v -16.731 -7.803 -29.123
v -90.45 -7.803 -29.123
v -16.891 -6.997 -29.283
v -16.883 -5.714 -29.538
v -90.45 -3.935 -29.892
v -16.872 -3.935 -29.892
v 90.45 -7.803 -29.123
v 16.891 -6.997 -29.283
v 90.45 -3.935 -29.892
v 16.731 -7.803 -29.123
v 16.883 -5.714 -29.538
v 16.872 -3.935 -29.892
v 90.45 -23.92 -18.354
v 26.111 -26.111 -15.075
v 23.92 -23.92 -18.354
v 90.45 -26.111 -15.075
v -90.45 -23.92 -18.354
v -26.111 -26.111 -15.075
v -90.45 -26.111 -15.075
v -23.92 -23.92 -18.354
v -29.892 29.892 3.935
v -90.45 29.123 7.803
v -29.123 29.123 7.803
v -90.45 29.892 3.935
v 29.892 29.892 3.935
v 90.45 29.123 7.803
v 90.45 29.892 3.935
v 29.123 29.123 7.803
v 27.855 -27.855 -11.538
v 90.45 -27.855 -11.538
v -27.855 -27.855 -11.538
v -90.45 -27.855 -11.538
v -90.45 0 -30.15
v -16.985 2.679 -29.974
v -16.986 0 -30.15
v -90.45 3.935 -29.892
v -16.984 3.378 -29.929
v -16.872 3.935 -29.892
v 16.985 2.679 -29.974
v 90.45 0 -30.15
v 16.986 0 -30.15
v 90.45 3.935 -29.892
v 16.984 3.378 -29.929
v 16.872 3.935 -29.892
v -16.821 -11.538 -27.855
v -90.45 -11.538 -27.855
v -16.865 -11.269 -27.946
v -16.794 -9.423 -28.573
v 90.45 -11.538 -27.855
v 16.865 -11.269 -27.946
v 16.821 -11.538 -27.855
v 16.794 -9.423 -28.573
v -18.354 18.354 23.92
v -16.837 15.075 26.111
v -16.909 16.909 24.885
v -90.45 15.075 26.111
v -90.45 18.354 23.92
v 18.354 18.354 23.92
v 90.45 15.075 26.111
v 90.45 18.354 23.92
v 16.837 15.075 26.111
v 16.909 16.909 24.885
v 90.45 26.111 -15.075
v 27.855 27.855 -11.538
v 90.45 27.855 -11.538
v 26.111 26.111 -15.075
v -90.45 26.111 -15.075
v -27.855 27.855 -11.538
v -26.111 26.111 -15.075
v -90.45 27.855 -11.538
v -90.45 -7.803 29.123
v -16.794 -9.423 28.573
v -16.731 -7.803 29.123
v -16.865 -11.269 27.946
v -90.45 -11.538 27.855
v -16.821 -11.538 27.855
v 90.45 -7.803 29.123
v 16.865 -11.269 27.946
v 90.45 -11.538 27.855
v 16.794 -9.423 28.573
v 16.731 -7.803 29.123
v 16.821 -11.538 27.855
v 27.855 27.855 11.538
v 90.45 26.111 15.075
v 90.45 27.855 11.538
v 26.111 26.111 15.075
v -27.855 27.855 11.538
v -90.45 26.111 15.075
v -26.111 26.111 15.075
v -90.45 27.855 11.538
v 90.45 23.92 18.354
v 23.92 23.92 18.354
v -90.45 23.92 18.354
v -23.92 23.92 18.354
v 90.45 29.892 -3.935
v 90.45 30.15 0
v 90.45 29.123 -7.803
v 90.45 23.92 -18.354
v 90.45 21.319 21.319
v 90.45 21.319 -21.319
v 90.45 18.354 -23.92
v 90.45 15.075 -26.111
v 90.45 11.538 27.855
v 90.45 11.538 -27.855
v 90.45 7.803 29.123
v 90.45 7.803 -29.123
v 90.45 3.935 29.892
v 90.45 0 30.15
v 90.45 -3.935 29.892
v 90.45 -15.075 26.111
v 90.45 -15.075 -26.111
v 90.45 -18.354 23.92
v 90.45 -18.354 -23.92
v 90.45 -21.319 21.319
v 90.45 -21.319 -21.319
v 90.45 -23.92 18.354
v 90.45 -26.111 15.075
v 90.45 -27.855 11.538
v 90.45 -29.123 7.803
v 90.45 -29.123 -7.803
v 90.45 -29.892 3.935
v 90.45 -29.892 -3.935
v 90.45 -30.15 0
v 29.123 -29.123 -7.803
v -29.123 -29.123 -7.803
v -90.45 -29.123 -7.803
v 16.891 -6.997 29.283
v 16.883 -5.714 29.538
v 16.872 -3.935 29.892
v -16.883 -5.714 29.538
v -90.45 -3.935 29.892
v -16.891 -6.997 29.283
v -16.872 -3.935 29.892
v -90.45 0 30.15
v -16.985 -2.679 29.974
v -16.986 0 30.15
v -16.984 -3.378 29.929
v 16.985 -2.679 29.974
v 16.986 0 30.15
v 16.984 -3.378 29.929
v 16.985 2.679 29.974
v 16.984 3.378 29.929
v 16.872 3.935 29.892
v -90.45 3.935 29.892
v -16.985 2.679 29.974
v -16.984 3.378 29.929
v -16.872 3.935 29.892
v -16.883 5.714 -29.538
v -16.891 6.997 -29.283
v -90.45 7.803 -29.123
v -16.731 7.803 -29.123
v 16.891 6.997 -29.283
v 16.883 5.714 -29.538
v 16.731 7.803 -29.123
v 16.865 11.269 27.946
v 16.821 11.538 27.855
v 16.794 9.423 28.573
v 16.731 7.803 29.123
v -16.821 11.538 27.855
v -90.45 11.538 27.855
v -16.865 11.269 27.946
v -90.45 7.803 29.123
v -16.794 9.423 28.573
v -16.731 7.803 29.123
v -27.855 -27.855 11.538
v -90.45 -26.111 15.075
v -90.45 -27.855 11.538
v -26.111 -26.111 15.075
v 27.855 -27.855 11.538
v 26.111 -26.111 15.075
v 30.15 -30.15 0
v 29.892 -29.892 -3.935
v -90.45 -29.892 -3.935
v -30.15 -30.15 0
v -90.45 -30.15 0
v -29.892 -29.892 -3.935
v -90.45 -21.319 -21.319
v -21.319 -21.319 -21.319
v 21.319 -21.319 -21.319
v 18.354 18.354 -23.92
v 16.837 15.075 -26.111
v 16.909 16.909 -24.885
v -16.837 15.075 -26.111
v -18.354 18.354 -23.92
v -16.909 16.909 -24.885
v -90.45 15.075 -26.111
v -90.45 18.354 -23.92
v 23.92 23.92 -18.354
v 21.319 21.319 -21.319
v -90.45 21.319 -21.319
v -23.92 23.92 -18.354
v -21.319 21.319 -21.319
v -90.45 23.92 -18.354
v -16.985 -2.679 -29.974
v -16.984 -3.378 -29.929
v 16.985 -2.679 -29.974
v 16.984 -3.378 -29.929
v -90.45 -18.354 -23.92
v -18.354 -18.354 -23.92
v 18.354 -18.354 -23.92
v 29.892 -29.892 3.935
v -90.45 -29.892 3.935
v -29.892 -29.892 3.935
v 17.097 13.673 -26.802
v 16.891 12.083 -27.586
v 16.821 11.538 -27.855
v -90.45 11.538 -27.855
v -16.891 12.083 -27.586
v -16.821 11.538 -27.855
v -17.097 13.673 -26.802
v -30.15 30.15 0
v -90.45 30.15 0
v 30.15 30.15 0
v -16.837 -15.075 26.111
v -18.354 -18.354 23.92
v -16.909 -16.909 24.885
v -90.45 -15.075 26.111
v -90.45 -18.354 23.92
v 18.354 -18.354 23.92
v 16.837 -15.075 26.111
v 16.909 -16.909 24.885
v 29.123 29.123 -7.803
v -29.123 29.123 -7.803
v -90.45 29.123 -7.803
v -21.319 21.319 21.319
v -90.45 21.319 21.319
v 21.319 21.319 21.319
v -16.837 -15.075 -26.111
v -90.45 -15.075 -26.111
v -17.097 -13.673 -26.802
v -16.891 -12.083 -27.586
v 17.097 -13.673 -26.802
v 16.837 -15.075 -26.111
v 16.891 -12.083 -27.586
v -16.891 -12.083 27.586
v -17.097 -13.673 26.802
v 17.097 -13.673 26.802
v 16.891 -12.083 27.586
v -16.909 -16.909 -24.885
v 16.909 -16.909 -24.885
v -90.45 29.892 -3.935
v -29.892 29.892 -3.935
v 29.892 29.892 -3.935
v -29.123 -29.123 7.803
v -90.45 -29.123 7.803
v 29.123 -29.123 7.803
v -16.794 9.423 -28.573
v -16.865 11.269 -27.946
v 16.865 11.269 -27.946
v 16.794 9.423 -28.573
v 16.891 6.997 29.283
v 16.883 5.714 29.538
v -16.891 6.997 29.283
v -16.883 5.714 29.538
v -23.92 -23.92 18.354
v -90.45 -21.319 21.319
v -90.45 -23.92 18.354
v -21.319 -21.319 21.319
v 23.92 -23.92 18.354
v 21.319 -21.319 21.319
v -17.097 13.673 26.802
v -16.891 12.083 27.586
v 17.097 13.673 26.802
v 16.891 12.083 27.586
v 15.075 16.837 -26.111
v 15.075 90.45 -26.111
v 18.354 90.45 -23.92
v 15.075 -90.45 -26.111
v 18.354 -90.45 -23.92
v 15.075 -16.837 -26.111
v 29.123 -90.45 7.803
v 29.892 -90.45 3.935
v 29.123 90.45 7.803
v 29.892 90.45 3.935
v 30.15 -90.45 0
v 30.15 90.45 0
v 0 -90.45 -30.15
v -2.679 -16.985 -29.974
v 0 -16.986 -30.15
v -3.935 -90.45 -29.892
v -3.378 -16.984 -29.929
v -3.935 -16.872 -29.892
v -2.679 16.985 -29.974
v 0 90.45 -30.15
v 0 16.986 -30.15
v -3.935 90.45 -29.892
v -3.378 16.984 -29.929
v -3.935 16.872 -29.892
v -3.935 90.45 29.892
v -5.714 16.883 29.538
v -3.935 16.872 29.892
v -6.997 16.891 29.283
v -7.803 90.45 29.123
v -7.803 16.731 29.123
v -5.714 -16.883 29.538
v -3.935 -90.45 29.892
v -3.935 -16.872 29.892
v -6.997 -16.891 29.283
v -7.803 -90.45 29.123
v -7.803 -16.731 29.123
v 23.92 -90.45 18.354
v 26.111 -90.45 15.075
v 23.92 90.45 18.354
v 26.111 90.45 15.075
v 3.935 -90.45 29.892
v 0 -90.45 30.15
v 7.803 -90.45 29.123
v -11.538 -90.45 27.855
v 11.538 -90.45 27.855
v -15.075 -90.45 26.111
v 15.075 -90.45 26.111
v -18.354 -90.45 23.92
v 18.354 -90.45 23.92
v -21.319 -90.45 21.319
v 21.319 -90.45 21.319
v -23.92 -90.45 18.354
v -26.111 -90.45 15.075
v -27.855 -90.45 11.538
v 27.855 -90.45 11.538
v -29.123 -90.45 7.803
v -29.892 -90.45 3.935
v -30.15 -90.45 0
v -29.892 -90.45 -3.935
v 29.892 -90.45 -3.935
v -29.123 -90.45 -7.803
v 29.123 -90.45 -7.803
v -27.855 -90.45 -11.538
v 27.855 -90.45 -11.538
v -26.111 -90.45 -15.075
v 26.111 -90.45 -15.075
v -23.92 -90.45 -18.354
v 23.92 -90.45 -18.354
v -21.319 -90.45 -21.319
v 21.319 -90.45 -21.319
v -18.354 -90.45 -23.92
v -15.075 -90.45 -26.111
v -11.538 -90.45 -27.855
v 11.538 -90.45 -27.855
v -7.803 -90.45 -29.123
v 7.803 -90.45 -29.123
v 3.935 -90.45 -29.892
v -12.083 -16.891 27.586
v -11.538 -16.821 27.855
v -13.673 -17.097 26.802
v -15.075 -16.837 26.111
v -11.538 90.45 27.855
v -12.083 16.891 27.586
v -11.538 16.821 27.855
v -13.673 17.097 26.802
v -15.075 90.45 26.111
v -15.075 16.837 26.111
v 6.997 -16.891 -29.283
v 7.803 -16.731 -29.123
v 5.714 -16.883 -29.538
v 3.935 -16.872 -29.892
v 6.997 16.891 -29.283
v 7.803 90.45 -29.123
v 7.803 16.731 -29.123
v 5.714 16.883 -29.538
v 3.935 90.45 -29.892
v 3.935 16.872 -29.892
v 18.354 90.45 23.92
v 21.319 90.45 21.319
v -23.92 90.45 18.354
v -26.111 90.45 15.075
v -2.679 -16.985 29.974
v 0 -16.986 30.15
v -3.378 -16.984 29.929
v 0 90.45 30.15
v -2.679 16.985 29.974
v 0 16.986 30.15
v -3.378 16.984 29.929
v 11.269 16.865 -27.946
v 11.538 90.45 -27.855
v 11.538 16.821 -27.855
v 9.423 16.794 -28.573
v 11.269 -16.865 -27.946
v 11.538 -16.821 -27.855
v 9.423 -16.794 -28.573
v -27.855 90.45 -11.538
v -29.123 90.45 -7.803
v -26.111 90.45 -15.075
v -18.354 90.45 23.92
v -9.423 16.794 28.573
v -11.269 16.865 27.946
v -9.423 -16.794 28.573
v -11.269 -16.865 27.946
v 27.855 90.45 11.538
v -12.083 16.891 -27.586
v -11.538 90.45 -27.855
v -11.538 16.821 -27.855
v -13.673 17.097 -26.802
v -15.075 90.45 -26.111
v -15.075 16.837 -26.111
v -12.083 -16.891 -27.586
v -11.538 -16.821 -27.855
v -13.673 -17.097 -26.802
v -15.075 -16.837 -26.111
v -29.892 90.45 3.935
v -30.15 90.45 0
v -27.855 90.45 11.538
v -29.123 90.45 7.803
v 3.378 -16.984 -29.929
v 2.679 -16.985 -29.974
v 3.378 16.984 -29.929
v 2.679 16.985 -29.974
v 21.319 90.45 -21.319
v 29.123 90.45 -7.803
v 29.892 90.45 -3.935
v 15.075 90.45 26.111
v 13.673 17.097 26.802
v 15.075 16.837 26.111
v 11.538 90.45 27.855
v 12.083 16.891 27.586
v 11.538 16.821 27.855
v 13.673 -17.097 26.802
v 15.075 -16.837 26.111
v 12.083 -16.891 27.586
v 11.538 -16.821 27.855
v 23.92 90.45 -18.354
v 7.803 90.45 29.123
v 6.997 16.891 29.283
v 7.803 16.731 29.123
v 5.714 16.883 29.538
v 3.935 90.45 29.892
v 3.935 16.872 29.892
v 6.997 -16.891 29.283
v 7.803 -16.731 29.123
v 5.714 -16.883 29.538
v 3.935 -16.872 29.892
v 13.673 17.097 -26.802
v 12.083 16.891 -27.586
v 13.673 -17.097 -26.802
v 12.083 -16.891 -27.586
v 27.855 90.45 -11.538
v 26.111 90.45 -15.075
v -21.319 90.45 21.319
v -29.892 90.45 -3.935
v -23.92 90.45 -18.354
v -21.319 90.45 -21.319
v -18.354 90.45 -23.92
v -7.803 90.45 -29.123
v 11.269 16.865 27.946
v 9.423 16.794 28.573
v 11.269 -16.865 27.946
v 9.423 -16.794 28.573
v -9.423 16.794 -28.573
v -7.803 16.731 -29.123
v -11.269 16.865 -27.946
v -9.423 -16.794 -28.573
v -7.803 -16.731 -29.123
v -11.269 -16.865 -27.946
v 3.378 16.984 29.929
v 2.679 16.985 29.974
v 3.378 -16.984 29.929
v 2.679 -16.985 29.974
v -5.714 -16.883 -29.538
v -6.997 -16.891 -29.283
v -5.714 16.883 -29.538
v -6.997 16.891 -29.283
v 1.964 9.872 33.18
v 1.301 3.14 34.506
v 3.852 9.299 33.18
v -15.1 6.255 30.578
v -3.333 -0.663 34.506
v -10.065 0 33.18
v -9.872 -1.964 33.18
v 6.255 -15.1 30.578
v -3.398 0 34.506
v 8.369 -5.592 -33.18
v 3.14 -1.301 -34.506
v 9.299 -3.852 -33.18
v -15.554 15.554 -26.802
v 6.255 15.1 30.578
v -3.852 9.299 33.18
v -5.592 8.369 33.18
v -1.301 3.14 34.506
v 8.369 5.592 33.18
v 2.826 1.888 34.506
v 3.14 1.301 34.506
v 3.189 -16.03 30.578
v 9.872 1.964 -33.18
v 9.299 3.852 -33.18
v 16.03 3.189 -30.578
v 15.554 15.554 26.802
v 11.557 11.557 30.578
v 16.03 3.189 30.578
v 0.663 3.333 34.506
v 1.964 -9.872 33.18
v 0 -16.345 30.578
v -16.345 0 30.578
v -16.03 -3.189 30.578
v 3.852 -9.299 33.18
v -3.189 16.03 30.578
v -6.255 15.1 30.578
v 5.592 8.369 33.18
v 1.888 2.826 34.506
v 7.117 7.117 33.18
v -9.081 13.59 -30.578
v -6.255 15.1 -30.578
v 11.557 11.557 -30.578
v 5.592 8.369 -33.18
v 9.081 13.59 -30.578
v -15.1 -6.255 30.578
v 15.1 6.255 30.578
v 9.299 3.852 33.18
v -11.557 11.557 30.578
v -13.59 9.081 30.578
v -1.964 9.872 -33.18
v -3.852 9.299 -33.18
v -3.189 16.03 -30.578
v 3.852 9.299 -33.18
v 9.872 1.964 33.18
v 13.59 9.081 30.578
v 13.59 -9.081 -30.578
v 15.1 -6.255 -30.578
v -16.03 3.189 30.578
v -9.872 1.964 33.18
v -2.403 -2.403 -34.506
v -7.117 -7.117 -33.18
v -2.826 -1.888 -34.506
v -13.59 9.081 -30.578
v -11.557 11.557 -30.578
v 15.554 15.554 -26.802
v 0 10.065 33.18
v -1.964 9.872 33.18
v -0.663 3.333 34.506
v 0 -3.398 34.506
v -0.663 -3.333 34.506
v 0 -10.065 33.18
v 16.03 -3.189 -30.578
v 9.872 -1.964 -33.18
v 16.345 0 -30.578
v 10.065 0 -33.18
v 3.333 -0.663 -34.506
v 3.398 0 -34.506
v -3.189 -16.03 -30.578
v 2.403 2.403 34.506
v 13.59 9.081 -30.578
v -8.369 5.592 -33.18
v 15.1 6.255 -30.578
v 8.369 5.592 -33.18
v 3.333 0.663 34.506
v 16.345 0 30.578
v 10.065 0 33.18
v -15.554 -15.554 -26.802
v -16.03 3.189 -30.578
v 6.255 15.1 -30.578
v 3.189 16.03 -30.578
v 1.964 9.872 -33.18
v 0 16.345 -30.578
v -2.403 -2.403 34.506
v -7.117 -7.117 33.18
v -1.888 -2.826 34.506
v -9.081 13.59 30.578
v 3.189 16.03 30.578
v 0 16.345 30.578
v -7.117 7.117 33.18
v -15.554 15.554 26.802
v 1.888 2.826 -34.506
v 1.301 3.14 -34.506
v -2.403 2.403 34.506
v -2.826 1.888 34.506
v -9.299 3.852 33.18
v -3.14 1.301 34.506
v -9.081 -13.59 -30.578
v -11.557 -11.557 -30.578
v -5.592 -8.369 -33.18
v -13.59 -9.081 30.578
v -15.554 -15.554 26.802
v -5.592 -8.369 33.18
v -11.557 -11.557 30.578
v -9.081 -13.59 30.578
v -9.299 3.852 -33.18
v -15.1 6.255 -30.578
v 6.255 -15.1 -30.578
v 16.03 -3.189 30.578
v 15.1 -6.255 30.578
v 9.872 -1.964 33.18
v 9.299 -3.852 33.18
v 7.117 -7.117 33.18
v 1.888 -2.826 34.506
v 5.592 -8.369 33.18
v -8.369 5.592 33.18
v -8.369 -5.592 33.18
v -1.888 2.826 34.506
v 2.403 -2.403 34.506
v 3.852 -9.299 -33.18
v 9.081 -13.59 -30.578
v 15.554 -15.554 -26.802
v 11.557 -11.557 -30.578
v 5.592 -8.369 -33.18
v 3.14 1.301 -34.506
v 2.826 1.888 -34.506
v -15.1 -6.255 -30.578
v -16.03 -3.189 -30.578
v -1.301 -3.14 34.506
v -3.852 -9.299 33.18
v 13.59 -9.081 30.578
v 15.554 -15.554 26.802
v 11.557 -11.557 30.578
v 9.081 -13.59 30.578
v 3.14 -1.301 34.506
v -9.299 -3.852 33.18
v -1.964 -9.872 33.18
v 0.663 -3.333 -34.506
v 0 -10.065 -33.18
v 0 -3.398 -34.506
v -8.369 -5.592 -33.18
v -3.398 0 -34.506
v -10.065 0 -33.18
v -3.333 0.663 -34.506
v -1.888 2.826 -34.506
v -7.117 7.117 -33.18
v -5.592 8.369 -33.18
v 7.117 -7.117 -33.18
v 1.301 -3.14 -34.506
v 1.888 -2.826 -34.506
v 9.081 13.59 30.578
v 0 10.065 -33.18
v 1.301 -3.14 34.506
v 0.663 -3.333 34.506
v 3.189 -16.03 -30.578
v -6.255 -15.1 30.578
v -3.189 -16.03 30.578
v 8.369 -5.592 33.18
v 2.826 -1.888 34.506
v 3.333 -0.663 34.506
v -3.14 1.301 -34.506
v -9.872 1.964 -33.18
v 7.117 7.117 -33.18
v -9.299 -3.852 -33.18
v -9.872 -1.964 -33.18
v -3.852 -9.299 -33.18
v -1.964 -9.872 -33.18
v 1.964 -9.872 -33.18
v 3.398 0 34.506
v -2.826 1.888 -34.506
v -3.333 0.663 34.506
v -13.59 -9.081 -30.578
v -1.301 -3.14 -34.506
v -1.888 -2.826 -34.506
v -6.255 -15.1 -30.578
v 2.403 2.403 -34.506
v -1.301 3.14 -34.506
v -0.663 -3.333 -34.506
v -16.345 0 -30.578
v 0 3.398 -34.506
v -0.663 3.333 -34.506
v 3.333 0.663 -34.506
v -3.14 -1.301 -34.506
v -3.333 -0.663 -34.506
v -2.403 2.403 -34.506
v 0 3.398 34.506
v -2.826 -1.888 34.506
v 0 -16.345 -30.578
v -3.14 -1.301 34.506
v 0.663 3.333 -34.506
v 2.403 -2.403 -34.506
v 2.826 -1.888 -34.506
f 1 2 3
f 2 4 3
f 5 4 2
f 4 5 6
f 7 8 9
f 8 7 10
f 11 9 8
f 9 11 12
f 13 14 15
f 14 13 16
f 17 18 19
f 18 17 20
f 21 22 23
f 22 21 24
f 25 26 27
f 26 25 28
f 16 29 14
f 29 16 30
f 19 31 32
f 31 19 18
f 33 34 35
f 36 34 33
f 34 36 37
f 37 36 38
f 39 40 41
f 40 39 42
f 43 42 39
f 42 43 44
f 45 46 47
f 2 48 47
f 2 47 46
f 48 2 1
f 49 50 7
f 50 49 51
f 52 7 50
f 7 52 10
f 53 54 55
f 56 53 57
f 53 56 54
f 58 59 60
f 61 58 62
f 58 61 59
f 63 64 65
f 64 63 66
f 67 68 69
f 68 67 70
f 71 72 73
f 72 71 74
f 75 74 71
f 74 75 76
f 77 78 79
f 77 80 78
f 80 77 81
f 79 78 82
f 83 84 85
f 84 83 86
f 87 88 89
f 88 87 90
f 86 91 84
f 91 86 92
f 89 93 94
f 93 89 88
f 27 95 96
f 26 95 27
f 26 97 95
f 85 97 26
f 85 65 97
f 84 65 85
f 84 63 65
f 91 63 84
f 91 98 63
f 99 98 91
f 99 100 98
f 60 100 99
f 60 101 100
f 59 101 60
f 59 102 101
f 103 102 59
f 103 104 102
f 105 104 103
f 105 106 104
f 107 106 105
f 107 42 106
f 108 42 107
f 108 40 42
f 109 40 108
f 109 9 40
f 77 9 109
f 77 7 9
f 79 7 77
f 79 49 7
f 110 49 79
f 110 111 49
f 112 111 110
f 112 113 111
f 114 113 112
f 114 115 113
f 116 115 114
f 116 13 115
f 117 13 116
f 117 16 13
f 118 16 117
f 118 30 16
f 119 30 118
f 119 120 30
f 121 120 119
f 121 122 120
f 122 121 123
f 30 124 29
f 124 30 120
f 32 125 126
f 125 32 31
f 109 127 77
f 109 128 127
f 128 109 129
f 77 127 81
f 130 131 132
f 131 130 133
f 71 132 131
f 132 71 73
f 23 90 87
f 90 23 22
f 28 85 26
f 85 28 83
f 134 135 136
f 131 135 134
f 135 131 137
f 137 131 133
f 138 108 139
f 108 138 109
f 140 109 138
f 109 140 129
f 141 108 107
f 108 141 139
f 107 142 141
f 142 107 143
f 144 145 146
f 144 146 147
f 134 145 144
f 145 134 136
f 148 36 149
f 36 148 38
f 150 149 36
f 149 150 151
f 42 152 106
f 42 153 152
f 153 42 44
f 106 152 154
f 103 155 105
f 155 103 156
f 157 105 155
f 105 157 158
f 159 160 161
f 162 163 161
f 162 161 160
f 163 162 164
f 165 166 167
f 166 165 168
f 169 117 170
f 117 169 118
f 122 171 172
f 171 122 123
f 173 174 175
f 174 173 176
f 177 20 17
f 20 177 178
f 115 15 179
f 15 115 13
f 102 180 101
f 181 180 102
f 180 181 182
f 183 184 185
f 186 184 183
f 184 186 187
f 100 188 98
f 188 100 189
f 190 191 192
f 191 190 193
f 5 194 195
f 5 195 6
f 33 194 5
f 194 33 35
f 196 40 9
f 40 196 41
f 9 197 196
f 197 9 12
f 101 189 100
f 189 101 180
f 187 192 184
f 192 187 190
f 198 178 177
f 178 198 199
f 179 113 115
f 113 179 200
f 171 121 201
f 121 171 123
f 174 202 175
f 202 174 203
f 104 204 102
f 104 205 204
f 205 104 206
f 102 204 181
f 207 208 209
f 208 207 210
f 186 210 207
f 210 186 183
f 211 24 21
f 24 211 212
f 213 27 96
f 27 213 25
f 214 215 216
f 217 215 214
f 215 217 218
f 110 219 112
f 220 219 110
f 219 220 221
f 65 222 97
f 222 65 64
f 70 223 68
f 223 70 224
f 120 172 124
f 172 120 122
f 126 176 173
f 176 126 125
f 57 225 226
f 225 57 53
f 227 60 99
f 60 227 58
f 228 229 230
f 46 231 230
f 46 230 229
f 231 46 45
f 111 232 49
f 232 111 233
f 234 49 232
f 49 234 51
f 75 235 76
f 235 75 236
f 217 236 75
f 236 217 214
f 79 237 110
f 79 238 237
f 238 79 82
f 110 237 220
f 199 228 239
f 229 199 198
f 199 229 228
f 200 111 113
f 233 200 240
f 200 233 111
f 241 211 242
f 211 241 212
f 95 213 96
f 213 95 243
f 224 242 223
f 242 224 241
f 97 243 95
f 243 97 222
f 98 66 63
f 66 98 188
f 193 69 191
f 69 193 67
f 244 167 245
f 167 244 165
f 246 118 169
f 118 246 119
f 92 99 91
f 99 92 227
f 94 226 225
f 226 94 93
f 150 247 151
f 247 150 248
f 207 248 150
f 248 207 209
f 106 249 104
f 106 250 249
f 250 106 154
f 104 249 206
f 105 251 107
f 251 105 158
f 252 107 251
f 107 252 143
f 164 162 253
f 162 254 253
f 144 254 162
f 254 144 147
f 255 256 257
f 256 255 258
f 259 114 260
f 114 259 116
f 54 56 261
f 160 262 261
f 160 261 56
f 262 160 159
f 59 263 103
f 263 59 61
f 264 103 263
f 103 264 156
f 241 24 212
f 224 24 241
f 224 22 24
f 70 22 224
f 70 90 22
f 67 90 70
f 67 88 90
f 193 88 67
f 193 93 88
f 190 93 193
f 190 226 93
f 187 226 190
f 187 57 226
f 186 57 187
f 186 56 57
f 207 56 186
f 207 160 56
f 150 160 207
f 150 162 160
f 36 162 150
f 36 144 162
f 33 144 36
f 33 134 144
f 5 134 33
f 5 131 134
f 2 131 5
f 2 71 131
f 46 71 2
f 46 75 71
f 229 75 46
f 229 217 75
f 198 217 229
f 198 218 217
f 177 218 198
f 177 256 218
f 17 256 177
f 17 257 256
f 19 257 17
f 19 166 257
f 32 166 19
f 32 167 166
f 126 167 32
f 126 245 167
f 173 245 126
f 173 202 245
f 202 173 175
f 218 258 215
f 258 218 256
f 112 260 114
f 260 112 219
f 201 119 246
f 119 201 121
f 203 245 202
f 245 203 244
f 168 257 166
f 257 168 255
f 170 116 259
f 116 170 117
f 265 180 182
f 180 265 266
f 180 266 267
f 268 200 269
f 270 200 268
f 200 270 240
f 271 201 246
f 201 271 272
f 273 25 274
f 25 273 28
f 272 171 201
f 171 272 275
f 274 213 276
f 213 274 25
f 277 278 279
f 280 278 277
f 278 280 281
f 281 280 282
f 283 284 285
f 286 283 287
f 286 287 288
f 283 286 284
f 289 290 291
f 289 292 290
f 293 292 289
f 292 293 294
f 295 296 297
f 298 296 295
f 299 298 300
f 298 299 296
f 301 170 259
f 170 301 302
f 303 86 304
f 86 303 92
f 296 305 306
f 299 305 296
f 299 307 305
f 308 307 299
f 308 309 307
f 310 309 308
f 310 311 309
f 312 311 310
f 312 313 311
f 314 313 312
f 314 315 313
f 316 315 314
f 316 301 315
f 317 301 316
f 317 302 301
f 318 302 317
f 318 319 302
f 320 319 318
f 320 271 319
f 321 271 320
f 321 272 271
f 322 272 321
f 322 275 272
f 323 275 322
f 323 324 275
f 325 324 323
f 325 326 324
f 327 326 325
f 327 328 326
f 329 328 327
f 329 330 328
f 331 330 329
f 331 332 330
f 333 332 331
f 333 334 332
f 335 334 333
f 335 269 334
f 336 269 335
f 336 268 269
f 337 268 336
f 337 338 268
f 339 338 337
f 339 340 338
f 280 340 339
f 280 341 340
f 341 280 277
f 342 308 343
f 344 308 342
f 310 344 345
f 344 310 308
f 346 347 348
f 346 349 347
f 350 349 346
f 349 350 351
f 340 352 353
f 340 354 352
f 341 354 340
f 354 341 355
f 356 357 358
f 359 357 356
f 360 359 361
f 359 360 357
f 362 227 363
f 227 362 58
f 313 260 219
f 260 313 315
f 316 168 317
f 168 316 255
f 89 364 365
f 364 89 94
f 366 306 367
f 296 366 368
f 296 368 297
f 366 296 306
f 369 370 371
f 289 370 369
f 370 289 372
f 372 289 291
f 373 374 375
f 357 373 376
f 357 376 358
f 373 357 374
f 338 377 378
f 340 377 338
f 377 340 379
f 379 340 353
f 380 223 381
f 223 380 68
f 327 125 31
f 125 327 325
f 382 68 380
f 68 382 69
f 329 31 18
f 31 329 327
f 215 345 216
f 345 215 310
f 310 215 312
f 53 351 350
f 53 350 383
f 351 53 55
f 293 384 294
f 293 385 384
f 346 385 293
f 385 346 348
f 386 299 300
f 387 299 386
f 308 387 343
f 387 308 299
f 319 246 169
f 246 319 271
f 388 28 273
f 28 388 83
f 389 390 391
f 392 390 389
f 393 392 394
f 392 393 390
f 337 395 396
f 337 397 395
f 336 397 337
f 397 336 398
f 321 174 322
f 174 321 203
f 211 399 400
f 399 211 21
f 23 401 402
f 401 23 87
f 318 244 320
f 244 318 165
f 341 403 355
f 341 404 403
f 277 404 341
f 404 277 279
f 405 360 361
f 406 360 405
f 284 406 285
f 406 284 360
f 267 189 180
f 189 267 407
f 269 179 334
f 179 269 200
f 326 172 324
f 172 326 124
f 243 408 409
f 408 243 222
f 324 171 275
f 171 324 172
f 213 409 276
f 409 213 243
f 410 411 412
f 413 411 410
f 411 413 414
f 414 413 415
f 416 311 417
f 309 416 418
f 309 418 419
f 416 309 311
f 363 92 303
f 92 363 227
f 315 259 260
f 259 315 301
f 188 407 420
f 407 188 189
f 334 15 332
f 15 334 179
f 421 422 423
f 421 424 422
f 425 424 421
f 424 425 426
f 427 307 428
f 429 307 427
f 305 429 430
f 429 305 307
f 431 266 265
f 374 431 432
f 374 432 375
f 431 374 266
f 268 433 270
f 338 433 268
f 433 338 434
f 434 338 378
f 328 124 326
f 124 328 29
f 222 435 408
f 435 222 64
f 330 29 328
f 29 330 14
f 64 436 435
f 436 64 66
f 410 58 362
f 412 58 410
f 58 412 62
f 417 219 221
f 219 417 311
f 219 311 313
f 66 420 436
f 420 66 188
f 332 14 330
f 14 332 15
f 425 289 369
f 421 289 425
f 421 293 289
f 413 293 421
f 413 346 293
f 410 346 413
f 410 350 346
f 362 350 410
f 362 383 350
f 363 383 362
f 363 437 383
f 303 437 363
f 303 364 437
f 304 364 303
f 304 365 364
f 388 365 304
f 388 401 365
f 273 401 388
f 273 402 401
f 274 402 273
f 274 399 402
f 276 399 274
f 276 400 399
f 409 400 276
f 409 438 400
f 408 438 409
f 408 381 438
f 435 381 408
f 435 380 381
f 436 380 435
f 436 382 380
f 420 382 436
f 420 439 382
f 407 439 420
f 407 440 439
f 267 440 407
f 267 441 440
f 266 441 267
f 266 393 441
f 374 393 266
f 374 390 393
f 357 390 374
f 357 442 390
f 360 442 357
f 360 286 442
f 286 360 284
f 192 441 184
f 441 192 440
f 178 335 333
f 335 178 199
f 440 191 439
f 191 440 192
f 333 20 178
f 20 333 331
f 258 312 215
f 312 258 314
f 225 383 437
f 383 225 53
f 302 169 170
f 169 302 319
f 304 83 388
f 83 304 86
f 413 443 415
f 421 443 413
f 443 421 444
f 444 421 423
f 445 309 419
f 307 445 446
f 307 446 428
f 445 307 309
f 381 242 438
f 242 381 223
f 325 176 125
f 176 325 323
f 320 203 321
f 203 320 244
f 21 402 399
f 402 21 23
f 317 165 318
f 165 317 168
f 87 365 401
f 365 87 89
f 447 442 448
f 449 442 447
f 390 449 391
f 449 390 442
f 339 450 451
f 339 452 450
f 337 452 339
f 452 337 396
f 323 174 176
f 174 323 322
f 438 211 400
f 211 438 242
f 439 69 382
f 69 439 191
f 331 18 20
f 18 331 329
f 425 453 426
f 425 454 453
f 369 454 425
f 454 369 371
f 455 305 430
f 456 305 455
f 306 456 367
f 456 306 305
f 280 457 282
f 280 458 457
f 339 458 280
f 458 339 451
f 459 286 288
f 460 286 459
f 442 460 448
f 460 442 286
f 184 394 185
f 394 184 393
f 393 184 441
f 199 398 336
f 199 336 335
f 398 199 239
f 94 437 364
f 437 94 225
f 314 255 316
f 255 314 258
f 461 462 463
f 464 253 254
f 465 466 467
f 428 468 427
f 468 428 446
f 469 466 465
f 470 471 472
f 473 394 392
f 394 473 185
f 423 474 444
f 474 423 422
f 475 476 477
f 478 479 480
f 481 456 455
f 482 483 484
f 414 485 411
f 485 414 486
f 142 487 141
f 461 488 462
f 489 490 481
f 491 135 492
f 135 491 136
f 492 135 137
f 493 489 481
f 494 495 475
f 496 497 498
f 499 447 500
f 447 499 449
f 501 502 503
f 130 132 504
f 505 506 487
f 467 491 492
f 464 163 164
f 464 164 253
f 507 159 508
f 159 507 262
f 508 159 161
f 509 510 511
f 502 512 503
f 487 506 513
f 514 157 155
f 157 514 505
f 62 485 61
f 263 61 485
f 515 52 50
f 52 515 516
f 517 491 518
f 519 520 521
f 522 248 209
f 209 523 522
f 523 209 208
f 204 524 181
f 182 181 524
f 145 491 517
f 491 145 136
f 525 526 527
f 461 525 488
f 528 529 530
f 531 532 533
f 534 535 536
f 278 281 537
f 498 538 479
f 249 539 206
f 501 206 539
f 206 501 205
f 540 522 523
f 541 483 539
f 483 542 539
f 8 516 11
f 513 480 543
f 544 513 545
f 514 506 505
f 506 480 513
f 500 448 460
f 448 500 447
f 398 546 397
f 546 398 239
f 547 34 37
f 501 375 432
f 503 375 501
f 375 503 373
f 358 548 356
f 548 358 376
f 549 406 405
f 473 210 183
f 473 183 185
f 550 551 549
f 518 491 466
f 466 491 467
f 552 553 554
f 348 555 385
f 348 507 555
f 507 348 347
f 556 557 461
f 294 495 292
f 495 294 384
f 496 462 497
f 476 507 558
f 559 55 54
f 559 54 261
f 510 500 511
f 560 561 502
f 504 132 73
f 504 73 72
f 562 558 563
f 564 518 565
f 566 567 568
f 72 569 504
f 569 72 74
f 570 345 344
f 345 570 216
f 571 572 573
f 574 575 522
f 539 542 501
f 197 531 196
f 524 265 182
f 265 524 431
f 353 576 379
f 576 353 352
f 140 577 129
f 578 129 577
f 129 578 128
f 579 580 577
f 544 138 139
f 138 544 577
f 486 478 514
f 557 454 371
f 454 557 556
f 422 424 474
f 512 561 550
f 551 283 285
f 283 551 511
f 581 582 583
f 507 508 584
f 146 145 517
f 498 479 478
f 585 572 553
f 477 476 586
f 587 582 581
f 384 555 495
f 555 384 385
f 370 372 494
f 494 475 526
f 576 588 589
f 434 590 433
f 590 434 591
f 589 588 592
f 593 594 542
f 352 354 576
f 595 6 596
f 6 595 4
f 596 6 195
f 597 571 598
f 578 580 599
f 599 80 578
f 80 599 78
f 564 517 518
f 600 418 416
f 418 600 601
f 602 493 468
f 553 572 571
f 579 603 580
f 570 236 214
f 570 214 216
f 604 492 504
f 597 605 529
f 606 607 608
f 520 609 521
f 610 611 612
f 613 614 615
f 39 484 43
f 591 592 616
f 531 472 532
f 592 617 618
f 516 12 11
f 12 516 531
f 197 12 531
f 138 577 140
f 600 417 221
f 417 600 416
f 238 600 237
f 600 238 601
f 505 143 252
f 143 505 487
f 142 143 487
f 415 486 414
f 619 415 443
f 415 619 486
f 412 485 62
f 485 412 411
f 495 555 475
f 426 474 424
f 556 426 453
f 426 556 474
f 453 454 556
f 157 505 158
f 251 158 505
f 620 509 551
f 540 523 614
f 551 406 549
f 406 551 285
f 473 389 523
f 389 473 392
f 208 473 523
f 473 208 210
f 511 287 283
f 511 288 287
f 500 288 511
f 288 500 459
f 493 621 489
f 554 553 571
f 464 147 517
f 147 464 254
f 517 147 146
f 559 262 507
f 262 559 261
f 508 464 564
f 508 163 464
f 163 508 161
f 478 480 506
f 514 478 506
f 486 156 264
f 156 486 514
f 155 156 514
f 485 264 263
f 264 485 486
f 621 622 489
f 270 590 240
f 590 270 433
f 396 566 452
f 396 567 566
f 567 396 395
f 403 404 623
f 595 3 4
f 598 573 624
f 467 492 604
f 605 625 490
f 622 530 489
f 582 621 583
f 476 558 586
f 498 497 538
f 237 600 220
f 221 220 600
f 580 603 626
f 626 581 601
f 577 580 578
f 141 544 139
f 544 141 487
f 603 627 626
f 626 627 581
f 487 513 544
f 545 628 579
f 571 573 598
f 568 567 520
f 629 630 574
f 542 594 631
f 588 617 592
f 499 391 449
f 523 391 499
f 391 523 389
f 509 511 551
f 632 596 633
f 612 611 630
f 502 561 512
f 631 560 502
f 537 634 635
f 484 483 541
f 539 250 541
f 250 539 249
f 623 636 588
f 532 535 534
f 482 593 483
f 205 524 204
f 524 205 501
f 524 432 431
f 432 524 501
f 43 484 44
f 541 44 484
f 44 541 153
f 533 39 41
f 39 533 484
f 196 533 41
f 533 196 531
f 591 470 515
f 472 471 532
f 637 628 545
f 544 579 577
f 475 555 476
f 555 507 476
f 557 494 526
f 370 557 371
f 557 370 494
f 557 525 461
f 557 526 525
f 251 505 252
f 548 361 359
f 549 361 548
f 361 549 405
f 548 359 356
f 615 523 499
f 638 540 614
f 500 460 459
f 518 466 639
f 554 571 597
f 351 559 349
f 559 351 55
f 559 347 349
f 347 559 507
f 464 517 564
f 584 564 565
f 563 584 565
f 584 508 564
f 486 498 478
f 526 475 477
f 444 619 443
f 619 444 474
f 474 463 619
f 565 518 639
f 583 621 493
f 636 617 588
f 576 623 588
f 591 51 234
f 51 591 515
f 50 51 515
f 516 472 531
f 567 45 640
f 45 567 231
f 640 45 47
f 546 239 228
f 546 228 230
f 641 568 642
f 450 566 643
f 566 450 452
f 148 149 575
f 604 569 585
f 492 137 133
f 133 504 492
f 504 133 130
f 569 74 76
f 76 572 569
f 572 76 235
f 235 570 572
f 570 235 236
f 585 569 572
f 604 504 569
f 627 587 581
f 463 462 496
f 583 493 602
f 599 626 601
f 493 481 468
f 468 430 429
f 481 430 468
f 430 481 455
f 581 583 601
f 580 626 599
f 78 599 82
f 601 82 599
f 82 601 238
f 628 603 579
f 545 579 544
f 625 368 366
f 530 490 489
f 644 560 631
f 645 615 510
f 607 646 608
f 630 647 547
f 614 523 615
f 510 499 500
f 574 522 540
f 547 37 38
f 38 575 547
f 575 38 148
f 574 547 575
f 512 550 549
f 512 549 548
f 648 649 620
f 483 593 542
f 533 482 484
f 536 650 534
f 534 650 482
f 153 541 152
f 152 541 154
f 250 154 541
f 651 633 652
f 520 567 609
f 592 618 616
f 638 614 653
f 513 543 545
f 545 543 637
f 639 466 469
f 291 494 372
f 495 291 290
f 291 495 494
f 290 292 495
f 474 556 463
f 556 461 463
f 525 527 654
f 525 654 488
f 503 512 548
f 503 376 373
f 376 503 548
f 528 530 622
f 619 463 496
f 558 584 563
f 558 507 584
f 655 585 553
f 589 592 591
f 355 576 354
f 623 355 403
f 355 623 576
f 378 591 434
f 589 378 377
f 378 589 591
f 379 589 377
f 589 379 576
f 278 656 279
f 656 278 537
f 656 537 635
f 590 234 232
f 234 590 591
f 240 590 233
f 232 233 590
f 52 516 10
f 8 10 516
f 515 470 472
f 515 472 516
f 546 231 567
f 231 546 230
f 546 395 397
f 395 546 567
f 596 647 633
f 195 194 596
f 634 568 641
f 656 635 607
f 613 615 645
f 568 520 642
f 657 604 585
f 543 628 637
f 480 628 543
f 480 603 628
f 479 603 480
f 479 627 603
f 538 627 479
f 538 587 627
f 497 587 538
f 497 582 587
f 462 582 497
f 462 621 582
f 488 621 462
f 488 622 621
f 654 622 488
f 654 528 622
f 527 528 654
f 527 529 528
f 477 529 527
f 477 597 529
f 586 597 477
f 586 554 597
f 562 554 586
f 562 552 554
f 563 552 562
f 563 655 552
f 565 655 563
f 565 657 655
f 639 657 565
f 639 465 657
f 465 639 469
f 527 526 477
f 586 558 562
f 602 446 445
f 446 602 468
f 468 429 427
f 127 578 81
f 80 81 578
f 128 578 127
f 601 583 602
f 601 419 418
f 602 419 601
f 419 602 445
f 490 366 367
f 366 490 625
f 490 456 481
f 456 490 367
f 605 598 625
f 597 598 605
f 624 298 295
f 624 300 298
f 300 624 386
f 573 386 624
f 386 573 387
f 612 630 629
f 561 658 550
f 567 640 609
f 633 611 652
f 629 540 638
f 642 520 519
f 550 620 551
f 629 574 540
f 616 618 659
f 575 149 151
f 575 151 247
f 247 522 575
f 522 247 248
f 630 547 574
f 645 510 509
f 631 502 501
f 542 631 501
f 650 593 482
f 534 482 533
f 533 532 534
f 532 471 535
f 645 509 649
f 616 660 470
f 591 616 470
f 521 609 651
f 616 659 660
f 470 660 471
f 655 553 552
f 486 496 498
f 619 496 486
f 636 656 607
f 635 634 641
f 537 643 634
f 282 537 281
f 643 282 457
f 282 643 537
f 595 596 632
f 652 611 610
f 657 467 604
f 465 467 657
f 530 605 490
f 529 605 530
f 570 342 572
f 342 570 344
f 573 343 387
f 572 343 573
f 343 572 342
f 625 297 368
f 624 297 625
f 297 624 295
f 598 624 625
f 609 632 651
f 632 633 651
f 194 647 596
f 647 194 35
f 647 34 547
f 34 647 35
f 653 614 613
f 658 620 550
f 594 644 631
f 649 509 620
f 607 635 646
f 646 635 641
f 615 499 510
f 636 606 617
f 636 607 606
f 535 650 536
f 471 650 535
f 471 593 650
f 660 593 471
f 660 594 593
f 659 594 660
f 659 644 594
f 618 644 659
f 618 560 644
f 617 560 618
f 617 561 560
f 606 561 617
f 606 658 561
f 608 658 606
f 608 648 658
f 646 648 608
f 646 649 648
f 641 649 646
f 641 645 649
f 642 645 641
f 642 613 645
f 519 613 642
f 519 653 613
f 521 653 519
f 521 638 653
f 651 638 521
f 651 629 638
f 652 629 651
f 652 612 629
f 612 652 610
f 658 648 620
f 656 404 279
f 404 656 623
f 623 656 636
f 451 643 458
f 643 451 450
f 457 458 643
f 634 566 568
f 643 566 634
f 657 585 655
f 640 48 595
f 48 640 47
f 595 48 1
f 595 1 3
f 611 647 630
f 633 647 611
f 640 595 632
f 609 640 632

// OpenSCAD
// Four-way cross fitting (equal ports).
od = 60.3;
len = od * 3.0;
union() {
    rotate([0, 90, 0]) cylinder(h = len, d = od, center = true, $fn = 48);
    rotate([90, 0, 0]) cylinder(h = len, d = od, center = true, $fn = 48);
    sphere(d = od * 1.15, $fn = 32);
}
